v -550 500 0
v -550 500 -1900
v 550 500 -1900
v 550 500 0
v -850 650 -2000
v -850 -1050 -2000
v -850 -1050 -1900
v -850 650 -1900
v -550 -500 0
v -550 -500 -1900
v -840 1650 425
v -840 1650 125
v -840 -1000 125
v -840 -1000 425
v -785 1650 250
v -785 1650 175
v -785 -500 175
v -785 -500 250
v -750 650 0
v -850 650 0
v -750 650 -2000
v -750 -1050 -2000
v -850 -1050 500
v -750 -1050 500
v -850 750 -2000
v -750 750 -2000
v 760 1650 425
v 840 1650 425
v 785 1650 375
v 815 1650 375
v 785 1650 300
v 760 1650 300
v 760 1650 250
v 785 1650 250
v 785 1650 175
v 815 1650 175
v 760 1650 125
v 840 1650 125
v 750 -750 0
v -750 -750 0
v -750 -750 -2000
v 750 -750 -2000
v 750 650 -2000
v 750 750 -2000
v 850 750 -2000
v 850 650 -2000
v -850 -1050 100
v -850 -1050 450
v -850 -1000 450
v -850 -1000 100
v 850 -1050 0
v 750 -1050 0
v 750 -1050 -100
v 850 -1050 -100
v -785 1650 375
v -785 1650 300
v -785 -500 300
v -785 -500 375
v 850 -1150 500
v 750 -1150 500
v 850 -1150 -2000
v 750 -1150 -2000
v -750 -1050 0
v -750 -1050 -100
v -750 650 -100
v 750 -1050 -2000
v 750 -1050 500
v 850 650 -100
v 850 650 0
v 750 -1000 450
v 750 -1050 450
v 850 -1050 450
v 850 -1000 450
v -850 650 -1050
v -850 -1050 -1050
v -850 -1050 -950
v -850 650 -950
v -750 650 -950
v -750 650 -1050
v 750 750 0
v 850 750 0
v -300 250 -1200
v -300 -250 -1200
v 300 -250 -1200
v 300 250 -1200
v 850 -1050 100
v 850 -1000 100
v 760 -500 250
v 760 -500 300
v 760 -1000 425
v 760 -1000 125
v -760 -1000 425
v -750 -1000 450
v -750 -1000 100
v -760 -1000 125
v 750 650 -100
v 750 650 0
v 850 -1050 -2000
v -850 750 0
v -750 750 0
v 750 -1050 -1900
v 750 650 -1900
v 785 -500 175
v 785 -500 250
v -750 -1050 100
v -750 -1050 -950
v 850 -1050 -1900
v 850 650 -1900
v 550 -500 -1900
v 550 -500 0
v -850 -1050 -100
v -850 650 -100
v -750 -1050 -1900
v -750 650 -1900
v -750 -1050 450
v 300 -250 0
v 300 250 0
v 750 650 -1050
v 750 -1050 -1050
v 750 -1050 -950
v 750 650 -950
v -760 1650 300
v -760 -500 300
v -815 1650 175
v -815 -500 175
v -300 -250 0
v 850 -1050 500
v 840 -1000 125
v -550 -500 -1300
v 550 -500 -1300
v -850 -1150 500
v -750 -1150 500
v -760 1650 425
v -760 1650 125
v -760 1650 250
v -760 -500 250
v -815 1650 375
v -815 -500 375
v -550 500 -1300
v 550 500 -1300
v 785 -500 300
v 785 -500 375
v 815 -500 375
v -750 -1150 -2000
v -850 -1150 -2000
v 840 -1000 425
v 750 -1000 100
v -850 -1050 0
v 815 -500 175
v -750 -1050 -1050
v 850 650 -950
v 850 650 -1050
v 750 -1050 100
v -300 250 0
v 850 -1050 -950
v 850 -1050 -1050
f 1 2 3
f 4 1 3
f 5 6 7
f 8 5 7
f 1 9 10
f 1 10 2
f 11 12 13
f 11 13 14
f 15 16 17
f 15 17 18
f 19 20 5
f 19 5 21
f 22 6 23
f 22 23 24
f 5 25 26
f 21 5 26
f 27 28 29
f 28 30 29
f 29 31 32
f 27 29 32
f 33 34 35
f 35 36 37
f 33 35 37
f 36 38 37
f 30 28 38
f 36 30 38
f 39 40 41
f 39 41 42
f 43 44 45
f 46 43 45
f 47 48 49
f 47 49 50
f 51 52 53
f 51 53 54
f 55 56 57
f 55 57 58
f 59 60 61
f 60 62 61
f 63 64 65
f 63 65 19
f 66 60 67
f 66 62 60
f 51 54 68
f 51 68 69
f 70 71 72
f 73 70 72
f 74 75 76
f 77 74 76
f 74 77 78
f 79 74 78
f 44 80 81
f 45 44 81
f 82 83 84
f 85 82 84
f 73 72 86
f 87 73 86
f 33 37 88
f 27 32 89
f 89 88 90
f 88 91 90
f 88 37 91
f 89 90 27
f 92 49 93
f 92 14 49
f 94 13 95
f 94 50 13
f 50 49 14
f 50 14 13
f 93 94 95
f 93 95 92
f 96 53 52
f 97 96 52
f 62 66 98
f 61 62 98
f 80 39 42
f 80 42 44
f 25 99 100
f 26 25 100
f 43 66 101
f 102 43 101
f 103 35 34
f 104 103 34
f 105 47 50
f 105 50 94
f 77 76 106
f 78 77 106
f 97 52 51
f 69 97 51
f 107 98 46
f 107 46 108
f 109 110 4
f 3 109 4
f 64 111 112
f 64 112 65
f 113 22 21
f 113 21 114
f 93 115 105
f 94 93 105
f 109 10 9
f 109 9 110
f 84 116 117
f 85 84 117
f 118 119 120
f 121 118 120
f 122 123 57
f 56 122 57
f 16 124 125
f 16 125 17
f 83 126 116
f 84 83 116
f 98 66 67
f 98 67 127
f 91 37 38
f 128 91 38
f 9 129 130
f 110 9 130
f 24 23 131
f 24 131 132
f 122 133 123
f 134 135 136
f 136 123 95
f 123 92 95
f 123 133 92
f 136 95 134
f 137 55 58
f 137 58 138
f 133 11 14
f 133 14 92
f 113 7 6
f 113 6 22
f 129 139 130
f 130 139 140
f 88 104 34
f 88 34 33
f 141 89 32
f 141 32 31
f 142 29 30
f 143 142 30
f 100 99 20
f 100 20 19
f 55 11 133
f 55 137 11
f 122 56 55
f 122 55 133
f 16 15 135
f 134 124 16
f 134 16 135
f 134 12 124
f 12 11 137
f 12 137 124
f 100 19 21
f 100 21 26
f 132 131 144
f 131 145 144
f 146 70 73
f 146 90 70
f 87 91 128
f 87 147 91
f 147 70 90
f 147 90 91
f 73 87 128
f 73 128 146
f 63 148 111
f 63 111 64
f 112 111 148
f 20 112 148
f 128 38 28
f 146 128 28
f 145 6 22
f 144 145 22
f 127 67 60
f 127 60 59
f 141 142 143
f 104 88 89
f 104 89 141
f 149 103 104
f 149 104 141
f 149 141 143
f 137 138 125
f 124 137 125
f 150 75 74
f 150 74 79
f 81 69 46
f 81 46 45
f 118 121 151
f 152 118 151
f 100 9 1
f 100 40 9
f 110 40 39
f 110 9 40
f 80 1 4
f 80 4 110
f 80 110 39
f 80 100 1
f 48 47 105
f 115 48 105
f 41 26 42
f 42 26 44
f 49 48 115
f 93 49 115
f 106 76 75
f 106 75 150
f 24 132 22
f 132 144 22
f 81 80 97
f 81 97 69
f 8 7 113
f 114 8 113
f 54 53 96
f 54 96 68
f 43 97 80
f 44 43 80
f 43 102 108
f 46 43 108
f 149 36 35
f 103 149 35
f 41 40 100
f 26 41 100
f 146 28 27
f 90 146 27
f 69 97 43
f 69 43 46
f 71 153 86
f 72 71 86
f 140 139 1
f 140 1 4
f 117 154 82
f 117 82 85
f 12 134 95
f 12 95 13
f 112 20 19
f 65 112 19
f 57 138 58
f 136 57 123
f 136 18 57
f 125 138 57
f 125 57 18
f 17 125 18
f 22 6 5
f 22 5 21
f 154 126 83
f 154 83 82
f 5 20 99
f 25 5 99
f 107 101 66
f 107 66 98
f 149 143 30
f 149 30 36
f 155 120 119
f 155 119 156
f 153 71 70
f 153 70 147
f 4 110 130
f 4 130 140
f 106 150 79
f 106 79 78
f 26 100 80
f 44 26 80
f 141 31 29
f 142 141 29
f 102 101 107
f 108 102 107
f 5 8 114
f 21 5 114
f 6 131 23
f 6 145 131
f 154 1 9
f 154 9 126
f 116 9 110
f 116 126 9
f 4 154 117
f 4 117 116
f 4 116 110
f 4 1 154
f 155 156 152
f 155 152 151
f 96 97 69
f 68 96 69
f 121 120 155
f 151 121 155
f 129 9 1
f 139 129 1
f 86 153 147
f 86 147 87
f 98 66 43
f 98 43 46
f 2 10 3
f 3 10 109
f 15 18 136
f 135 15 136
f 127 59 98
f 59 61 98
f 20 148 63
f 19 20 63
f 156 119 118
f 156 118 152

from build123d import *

# Parameters (mm, degrees)
SKETCH_1_W         = 1100
SKETCH_1_H         = 1000
SKETCH_1_W_2       = 600
SKETCH_1_H_2       = 500
EXTRUDE_1_DEPTH    = 1300
SKETCH_2_W         = 600
SKETCH_2_H         = 100
EXTRUDE_2_DEPTH    = 500
SKETCH_3_W         = 1500
SKETCH_3_H         = 1500
SKETCH_3_W_2       = 1100
SKETCH_3_H_2       = 1000
EXTRUDE_3_DEPTH    = 2000
SKETCH_4_W         = 1100
SKETCH_4_H         = 100
EXTRUDE_4_DEPTH    = 1000
SKETCH_7_W         = 100
SKETCH_7_H         = 100
EXTRUDE_7_DEPTH    = 2000
EXTRUDE_7_2_DEPTH  = 2000
EXTRUDE_7_3_DEPTH  = 2000
EXTRUDE_7_4_DEPTH  = 2000
SKETCH_7_2_W       = 100
SKETCH_7_2_H       = 100
EXTRUDE_8_DEPTH    = 500
SKETCH_8_W         = 100
SKETCH_8_H         = 100
EXTRUDE_9_DEPTH    = 1700
EXTRUDE_9_2_DEPTH  = 1700
EXTRUDE_9_3_DEPTH  = 1700
EXTRUDE_9_4_DEPTH  = 1700
EXTRUDE_9_5_DEPTH  = 1700
EXTRUDE_9_6_DEPTH  = 1700
SKETCH_9_W         = 100
SKETCH_9_H         = 350
EXTRUDE_10_DEPTH   = 50
EXTRUDE_10_2_DEPTH = 50
EXTRUDE_11_DEPTH   = 2700
EXTRUDE_12_DEPTH   = 500


with BuildPart() as part:
    # Эскиз1 → Бобышка-Вытянуть1 (new body)
    with BuildSketch(Plane.XY):
        Rectangle(SKETCH_1_W, SKETCH_1_H)
        Rectangle(SKETCH_1_W_2, SKETCH_1_H_2, mode=Mode.SUBTRACT)
    extrude(amount=-EXTRUDE_1_DEPTH)

    # Эскиз2 → Бобышка-Вытянуть2 (add)
    with BuildSketch(Plane(origin=(0, -250, 0), x_dir=(1, 0, 0), z_dir=(0, 1, 0))):
        with Locations((0, 1250)):
            Rectangle(SKETCH_2_W, SKETCH_2_H)
    extrude(amount=EXTRUDE_2_DEPTH)


with BuildPart() as body_2:
    # Эскиз3 → Бобышка-Вытянуть3 (new body)
    with BuildSketch(Plane.XY):
        Rectangle(SKETCH_3_W, SKETCH_3_H)
        Rectangle(SKETCH_3_W_2, SKETCH_3_H_2, mode=Mode.SUBTRACT)
    extrude(amount=-EXTRUDE_3_DEPTH)

    # Эскиз4 → Бобышка-Вытянуть4 (add)
    with BuildSketch(Plane(origin=(0, -500, 0), x_dir=(1, 0, 0), z_dir=(0, 1, 0))):
        with Locations((0, 1950)):
            Rectangle(SKETCH_4_W, SKETCH_4_H)
    extrude(amount=EXTRUDE_4_DEPTH)


with BuildPart() as body_3:
    # Эскиз7 → Бобышка-Вытянуть7 (new body)
    with BuildSketch(Plane.XY):
        with Locations((-800, 700)):
            Rectangle(SKETCH_7_W, SKETCH_7_H)
    extrude(amount=-EXTRUDE_7_DEPTH)


with BuildPart() as body_4:
    # Эскиз7 → Extrude 7 2 (new body)
    with BuildSketch(Plane.XY):
        with Locations((-800, -1100)):
            Rectangle(SKETCH_7_W, SKETCH_7_H)
    extrude(amount=-EXTRUDE_7_2_DEPTH)



with BuildPart() as body_5:
    # Эскиз7 → Extrude 7 3 (new body)
    with BuildSketch(Plane.XY):
        with Locations((800, -1100)):
            Rectangle(SKETCH_7_W, SKETCH_7_H)
    extrude(amount=-EXTRUDE_7_3_DEPTH)


with BuildPart() as body_6:
    # Эскиз7 → Extrude 7 4 (new body)
    with BuildSketch(Plane.XY):
        with Locations((800, 700)):
            Rectangle(SKETCH_7_W, SKETCH_7_H)
    extrude(amount=-EXTRUDE_7_4_DEPTH)


with BuildPart() as body_4_1:
    add(body_4.part)

    add(body_5.part)  # Бобышка-Вытянуть8 merges body 5
    # Эскиз7<2> → Бобышка-Вытянуть8 (add)
    with BuildSketch(Plane.XY):
        with Locations((-800, -1100)):
            Rectangle(SKETCH_7_2_W, SKETCH_7_2_H)
        with Locations((800, -1100)):
            Rectangle(SKETCH_7_2_W, SKETCH_7_2_H)
    extrude(amount=EXTRUDE_8_DEPTH)


with BuildPart() as body_6_2:
    # Эскиз8 → Бобышка-Вытянуть9 (new body)
    with BuildSketch(Plane.XZ.offset(-650)):
        with Locations((800, -50)):
            Rectangle(SKETCH_8_W, SKETCH_8_H)
    extrude(amount=EXTRUDE_9_DEPTH)


with BuildPart() as body_7:
    # Эскиз8 → Extrude 9 2 (new body)
    with BuildSketch(Plane.XZ.offset(-650)):
        with Locations((800, -1950)):
            Rectangle(SKETCH_8_W, SKETCH_8_H)
    extrude(amount=EXTRUDE_9_2_DEPTH)


with BuildPart() as body_8:
    # Эскиз8 → Extrude 9 3 (new body)
    with BuildSketch(Plane.XZ.offset(-650)):
        with Locations((800, -1000)):
            Rectangle(SKETCH_8_W, SKETCH_8_H)
    extrude(amount=EXTRUDE_9_3_DEPTH)


with BuildPart() as body_9:
    # Эскиз8 → Extrude 9 4 (new body)
    with BuildSketch(Plane.XZ.offset(-650)):
        with Locations((-800, -1000)):
            Rectangle(SKETCH_8_W, SKETCH_8_H)
    extrude(amount=EXTRUDE_9_4_DEPTH)


with BuildPart() as body_10:
    # Эскиз8 → Extrude 9 5 (new body)
    with BuildSketch(Plane.XZ.offset(-650)):
        with Locations((-800, -1950)):
            Rectangle(SKETCH_8_W, SKETCH_8_H)
    extrude(amount=EXTRUDE_9_5_DEPTH)


with BuildPart() as body_11:
    # Эскиз8 → Extrude 9 6 (new body)
    with BuildSketch(Plane.XZ.offset(-650)):
        with Locations((-800, -50)):
            Rectangle(SKETCH_8_W, SKETCH_8_H)
    extrude(amount=EXTRUDE_9_6_DEPTH)


with BuildPart() as body_12:
    # Эскиз9 → Бобышка-Вытянуть10 (new body)
    with BuildSketch(Plane(origin=(0, -1050, 0), x_dir=(1, 0, 0), z_dir=(0, 1, 0))):
        with Locations((800, -275)):
            Rectangle(SKETCH_9_W, SKETCH_9_H)
        Polygon((760, -125), (840, -125), (840, -425), (760, -425), (760, -300), (785, -300), (785, -375), (815, -375), (815, -175), (785, -175), (785, -250), (760, -250), align=None, mode=Mode.SUBTRACT)
    extrude(amount=EXTRUDE_10_DEPTH)


with BuildPart() as body_13:
    # Эскиз9 → Extrude 10 2 (new body)
    with BuildSketch(Plane(origin=(0, -1050, 0), x_dir=(1, 0, 0), z_dir=(0, 1, 0))):
        with Locations((-800, -275)):
            Rectangle(SKETCH_9_W, SKETCH_9_H)
        Polygon((-760, -250), (-760, -125), (-840, -125), (-840, -425), (-760, -425), (-760, -300), (-785, -300), (-785, -375), (-815, -375), (-815, -175), (-785, -175), (-785, -250), align=None, mode=Mode.SUBTRACT)
    extrude(amount=EXTRUDE_10_2_DEPTH)


    add(body_12.part)  # Бобышка-Вытянуть11 merges body 12
    # Эскиз9<2> → Бобышка-Вытянуть11 (add)
    with BuildSketch(Plane(origin=(0, -1050, 0), x_dir=(1, 0, 0), z_dir=(0, 1, 0))):
        Polygon((760, -250), (760, -125), (840, -125), (840, -425), (760, -425), (760, -300), (785, -300), (785, -375), (815, -375), (815, -175), (785, -175), (785, -250), align=None)
        Polygon((-760, -250), (-760, -125), (-840, -125), (-840, -425), (-760, -425), (-760, -300), (-785, -300), (-785, -375), (-815, -375), (-815, -175), (-785, -175), (-785, -250), align=None)
    extrude(amount=EXTRUDE_11_DEPTH)

    # Эскиз10 → Бобышка-Вытянуть12 (add)
    with BuildSketch(Plane(origin=(0, -1000, 0), x_dir=(1, 0, 0), z_dir=(0, 1, 0))):
        Polygon((815, -375), (815, -175), (785, -175), (785, -250), (760, -250), (760, -300), (785, -300), (785, -375), align=None)
        Polygon((-760, -250), (-785, -250), (-785, -175), (-815, -175), (-815, -375), (-785, -375), (-785, -300), (-760, -300), align=None)
    extrude(amount=EXTRUDE_12_DEPTH)


solid = Compound([part.part, body_2.part, body_3.part, body_6.part, body_4_1.part, body_6_2.part, body_7.part, body_8.part, body_9.part, body_10.part, body_11.part, body_13.part])
